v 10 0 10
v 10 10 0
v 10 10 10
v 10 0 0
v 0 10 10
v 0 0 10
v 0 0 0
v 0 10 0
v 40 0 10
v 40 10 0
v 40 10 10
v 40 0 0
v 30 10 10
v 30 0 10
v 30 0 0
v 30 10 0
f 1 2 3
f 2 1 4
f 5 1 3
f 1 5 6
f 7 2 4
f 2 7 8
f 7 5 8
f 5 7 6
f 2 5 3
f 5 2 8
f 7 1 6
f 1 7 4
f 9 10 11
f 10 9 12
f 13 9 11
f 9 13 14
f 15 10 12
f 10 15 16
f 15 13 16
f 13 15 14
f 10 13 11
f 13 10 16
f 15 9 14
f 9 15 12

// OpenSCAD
// Fixture: two disconnected 10mm cubes -- multi-component gate test.
cube([10,10,10]);
translate([30,0,0]) cube([10,10,10]);
